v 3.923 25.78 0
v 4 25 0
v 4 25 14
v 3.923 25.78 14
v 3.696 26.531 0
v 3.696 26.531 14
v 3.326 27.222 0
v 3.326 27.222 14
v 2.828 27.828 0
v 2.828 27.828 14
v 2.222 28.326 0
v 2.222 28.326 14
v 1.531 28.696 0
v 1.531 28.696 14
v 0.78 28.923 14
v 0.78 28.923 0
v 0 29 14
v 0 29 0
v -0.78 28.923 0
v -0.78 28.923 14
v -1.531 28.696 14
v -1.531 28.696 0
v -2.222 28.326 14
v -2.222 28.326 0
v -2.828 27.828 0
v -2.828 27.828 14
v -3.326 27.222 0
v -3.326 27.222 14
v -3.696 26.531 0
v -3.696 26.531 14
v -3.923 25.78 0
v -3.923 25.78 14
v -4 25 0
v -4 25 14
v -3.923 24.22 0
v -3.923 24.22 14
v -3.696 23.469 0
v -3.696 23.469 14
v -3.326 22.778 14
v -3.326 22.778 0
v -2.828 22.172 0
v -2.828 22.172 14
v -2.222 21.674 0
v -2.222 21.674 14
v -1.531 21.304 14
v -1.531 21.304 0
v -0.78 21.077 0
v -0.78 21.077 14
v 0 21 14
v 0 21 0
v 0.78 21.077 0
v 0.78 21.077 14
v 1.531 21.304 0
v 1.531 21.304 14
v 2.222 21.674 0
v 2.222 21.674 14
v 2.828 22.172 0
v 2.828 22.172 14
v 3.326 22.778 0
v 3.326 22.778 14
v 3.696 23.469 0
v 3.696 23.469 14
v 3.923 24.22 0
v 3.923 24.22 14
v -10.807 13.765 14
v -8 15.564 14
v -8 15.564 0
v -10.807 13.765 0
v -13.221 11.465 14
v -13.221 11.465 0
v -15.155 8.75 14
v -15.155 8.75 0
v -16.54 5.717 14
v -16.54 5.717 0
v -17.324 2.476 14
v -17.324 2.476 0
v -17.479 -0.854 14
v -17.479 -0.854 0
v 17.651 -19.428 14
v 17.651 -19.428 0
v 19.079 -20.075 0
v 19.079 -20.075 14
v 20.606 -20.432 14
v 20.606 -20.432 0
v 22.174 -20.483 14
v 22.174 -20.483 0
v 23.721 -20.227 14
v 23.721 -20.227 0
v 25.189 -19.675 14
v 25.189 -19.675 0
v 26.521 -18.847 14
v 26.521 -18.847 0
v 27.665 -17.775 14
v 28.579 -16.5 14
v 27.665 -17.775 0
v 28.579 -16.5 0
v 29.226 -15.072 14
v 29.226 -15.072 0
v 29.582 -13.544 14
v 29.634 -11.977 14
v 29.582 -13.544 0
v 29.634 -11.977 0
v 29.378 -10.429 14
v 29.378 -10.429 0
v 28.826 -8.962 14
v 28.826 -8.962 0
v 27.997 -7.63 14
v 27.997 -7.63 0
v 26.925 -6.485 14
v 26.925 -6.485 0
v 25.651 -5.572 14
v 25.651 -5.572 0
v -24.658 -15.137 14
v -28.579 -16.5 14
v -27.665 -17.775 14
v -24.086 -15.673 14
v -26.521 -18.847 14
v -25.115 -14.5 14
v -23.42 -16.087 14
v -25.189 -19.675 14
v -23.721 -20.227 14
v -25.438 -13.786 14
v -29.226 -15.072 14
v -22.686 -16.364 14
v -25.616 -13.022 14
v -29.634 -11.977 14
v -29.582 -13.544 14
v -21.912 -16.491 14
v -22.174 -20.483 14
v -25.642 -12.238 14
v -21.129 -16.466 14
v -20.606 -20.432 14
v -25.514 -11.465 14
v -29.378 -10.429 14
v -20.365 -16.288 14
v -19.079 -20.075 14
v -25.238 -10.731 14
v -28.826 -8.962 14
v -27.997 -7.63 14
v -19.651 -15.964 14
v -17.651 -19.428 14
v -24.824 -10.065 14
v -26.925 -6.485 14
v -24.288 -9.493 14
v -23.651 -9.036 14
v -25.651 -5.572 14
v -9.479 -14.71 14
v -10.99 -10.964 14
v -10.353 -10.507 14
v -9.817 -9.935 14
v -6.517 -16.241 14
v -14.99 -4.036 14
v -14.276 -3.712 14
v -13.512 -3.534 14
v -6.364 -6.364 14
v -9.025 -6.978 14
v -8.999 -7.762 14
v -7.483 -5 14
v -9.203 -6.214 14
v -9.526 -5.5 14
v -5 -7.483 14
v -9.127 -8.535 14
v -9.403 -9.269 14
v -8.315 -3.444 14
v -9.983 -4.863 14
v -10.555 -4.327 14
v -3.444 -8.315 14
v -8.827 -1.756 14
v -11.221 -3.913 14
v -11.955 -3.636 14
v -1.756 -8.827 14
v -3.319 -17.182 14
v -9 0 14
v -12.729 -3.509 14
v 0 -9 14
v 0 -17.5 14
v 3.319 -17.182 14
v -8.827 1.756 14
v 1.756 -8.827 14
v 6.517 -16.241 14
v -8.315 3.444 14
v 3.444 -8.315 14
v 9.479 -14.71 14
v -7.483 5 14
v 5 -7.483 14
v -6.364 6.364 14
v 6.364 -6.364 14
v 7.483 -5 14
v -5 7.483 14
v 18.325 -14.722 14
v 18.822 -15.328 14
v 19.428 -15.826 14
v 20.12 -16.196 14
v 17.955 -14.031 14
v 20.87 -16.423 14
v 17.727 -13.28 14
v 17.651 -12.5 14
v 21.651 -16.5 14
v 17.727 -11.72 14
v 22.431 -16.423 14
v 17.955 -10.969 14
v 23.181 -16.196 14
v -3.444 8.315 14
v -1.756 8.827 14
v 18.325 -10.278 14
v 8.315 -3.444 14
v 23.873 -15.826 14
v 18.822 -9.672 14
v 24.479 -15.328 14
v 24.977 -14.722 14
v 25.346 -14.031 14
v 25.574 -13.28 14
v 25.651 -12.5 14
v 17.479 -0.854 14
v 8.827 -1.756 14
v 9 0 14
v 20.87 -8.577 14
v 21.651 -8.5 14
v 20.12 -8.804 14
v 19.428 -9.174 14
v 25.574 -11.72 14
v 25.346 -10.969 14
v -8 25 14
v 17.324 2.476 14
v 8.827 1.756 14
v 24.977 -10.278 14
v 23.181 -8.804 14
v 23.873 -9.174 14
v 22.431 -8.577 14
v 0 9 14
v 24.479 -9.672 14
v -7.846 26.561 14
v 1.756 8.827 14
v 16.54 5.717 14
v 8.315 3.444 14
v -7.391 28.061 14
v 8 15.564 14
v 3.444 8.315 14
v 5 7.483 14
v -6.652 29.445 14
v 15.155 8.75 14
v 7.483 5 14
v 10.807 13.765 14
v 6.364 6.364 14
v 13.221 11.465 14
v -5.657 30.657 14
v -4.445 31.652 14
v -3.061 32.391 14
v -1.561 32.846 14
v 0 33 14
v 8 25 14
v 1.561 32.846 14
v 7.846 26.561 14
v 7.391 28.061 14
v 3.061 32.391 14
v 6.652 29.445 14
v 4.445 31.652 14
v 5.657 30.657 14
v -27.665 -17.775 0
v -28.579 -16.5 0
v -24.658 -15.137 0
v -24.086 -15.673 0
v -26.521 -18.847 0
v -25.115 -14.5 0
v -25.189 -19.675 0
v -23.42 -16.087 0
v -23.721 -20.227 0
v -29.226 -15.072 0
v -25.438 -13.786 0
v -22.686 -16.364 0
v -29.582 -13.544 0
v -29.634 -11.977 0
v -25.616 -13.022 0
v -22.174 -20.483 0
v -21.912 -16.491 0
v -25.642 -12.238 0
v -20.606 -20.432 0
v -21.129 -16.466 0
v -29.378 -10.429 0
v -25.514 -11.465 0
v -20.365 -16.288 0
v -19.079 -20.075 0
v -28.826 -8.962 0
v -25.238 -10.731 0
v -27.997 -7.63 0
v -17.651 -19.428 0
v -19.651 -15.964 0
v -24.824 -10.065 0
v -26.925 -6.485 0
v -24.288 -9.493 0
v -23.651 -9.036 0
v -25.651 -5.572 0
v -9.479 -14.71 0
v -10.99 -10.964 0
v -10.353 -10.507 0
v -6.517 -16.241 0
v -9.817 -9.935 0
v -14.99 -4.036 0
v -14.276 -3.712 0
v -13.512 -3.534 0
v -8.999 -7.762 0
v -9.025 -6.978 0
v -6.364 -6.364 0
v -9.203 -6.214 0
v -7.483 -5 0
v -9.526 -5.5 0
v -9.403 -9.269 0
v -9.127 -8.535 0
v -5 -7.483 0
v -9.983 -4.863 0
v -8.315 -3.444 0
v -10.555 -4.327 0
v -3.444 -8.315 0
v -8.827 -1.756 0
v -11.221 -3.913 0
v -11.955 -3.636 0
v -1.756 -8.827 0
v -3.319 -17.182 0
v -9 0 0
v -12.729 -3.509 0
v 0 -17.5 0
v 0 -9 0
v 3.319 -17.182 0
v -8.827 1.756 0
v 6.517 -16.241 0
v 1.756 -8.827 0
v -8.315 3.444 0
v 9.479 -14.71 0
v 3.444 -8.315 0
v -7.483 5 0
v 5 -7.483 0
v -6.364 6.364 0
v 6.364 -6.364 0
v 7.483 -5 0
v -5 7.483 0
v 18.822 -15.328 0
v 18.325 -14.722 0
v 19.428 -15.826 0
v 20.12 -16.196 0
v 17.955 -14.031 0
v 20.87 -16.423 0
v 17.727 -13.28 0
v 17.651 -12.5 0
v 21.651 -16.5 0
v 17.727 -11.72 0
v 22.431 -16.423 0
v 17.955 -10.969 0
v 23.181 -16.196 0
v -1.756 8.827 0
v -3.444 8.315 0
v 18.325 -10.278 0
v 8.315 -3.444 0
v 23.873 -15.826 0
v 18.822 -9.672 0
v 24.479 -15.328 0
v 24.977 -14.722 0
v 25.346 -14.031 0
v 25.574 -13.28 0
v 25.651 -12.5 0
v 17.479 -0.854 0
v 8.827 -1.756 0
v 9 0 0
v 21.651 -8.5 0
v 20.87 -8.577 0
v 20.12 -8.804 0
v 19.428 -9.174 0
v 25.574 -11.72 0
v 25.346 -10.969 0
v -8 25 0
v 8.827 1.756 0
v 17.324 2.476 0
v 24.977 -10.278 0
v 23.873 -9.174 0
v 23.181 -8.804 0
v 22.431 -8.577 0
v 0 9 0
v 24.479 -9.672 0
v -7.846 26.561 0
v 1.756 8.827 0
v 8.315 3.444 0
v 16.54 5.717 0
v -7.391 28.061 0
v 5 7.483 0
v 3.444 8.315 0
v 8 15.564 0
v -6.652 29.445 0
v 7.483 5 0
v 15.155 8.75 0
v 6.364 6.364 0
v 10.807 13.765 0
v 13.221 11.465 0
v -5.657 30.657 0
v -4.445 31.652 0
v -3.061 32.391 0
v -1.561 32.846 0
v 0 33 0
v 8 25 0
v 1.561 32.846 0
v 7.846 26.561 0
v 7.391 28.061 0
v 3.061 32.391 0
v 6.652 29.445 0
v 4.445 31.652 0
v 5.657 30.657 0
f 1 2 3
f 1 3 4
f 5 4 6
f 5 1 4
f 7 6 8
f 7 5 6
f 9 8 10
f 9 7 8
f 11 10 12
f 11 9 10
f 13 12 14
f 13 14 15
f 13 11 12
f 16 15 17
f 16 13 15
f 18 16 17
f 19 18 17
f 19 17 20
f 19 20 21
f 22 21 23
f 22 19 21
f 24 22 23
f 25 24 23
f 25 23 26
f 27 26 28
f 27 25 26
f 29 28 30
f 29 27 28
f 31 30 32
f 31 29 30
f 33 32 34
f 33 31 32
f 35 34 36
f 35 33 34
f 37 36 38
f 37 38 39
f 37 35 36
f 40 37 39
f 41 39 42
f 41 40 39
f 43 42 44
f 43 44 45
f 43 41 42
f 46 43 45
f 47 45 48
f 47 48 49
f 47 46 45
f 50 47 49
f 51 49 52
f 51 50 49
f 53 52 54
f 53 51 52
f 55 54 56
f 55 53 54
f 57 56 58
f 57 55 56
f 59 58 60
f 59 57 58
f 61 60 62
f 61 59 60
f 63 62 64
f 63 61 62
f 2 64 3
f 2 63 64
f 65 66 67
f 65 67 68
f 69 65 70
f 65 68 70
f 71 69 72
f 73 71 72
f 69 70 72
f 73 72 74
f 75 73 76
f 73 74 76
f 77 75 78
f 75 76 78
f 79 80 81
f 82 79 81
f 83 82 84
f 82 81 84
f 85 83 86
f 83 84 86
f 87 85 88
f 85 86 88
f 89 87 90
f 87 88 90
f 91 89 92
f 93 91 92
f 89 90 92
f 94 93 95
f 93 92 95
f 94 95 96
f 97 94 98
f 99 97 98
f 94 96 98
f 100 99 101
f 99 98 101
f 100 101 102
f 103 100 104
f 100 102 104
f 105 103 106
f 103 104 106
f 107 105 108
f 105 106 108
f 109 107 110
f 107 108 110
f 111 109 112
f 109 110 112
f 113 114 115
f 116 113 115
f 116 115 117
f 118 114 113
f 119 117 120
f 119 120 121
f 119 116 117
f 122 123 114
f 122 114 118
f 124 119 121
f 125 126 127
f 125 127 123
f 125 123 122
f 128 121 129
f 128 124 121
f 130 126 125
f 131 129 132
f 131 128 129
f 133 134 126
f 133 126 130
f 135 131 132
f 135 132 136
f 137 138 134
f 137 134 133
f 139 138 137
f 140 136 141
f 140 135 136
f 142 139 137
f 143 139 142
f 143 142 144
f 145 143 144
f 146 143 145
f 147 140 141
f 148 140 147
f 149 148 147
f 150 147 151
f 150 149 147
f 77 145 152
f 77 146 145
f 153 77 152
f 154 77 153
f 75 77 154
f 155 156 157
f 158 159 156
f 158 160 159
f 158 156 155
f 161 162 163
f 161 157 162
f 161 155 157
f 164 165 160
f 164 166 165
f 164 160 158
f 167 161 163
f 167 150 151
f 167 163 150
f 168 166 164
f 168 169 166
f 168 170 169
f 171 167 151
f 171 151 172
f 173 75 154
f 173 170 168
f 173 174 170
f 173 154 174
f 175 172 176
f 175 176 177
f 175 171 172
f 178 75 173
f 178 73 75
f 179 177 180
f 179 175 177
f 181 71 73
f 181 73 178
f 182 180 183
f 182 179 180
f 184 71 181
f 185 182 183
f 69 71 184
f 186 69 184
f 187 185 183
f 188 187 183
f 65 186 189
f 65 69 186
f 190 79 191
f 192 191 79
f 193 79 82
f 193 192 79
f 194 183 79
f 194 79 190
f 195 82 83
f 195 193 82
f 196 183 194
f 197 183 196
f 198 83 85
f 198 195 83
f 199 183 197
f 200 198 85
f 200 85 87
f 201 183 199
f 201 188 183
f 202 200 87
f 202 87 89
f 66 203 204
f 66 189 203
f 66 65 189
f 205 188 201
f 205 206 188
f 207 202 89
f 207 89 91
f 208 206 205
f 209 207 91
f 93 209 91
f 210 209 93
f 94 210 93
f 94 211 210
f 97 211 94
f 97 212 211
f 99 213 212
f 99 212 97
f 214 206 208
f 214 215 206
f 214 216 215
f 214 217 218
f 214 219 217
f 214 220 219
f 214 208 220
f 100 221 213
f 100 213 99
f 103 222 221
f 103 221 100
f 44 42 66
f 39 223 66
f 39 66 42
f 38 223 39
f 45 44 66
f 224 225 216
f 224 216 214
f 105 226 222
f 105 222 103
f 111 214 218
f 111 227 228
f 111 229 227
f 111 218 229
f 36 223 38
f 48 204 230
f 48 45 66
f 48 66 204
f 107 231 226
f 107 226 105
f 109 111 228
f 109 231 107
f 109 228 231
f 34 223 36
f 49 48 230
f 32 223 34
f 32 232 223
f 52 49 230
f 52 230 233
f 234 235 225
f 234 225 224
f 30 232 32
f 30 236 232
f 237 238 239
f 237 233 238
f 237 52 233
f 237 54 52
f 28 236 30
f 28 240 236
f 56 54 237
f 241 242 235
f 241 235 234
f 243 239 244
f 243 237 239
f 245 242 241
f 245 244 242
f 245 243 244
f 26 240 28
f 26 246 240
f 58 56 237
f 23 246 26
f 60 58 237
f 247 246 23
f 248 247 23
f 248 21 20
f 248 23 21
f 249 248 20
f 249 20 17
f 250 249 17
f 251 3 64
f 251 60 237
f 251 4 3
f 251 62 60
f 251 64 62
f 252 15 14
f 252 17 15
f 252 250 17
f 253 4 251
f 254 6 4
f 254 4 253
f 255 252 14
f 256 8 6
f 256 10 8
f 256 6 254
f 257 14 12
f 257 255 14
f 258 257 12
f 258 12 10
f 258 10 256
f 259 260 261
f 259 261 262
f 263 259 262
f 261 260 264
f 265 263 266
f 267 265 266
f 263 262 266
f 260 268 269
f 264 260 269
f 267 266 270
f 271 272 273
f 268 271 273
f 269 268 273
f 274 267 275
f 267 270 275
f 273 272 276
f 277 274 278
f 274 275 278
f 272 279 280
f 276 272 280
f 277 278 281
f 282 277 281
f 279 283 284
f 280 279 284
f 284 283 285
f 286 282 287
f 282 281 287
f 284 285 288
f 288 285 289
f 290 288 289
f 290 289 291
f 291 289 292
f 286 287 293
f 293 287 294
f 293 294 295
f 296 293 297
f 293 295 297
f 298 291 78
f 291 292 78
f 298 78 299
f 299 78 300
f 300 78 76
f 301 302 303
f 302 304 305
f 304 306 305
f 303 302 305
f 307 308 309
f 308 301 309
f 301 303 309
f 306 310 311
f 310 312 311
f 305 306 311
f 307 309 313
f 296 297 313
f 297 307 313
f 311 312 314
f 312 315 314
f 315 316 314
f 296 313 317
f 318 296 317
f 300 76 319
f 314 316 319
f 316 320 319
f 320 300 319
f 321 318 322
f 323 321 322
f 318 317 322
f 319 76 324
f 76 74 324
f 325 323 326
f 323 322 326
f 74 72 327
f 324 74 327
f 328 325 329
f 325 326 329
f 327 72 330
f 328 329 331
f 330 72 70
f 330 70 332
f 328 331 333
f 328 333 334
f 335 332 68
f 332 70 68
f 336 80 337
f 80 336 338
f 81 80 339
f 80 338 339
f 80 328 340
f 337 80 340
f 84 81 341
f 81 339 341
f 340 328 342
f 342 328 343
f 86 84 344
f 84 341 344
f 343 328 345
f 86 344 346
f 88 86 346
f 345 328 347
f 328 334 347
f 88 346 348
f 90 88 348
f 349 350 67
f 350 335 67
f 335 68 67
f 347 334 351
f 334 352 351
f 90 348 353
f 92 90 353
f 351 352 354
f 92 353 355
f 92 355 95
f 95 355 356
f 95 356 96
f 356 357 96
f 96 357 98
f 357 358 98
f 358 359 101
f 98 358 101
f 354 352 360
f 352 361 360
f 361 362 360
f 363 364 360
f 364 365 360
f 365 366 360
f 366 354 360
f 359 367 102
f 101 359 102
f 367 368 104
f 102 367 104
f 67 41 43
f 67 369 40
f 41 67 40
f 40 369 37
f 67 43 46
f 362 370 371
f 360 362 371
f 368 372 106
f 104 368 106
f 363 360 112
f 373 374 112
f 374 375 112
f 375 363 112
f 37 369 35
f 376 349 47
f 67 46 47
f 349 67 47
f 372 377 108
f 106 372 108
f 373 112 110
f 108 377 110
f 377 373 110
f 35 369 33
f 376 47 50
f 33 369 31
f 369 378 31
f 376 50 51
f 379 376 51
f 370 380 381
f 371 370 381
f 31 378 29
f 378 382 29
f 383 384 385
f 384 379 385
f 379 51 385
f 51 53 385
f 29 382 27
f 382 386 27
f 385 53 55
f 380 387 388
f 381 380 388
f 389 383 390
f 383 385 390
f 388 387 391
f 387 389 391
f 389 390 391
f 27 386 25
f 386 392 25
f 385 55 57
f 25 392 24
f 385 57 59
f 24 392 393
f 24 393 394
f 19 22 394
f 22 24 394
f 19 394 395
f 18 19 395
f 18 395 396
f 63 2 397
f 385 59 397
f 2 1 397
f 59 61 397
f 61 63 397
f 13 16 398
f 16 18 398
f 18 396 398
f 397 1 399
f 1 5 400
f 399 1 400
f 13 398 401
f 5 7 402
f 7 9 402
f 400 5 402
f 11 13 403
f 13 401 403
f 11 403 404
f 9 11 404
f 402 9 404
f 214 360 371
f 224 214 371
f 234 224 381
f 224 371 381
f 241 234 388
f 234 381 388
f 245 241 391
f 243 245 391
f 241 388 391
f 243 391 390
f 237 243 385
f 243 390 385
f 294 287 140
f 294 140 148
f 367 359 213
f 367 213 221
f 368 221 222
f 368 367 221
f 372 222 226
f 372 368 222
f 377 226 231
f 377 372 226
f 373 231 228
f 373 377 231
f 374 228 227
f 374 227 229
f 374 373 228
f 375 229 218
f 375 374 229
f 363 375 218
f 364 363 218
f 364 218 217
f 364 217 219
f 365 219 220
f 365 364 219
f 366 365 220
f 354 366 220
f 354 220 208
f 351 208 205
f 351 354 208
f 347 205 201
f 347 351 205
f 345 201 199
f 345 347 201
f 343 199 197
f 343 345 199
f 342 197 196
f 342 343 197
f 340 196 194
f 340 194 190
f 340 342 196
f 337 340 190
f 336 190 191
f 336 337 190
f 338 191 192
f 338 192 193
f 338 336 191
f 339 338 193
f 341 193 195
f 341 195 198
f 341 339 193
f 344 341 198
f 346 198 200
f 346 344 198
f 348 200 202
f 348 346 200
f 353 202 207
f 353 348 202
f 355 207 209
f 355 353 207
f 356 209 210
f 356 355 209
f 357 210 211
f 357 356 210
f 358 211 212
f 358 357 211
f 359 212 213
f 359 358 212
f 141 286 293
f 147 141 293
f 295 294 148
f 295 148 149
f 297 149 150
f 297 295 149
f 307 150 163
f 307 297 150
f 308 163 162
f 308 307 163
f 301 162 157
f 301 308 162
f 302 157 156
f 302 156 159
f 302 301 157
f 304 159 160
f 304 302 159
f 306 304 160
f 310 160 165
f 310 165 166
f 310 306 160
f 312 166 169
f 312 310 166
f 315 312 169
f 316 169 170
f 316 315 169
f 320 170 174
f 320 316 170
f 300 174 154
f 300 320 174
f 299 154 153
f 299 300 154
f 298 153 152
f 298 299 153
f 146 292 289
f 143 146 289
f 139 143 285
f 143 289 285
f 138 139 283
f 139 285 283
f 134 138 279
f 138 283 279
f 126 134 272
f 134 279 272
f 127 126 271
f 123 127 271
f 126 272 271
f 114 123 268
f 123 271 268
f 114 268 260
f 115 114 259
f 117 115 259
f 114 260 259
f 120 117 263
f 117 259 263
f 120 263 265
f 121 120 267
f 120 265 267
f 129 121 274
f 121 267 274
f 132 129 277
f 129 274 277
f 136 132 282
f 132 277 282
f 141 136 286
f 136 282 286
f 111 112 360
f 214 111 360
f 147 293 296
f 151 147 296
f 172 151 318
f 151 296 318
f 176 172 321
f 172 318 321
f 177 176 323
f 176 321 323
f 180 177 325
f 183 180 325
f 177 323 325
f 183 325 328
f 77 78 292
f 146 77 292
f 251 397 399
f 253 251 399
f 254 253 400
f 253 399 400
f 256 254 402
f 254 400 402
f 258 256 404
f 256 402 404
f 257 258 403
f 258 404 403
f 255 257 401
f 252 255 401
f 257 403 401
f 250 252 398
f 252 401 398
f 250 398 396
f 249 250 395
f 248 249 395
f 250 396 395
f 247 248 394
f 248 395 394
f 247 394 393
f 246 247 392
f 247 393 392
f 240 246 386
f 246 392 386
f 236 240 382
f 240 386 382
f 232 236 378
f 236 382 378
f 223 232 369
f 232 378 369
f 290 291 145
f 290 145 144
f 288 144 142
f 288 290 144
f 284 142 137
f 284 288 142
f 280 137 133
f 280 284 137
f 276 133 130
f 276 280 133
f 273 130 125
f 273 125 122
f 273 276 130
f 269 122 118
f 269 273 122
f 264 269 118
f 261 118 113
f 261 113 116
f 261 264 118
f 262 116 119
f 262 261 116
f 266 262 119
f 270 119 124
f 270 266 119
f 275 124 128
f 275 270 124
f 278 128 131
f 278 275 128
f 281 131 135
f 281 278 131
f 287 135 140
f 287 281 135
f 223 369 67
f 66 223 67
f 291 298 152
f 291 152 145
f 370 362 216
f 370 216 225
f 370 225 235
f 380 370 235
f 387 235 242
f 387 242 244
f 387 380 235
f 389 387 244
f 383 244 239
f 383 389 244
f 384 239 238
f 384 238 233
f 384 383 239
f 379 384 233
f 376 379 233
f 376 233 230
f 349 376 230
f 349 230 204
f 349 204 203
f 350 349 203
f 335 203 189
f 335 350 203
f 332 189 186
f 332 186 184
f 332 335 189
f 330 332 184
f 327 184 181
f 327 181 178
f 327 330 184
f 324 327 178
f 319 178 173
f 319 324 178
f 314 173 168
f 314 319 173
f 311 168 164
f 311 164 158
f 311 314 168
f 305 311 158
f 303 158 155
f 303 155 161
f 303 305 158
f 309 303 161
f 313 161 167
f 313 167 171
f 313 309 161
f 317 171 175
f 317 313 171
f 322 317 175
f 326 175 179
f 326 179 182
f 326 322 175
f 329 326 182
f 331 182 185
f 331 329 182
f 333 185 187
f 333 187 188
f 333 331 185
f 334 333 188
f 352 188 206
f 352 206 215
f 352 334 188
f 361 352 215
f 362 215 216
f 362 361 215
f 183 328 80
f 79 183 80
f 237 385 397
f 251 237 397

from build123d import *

# Parameters (mm, degrees)
SKETCH_1_R      = 9
SKETCH_1_R_2    = 4
EXTRUDE_1_DEPTH = 14


with BuildPart() as part:
    # Эскиз1 → Бобышка-Вытянуть1 (new body)
    with BuildSketch(Plane.XY):
        with BuildLine():
            Line((-8, 25), (-8, 15.564382416))
            ThreePointArc((-8, 15.564382416), (-15.155444566, 8.75), (-17.479150567, -0.853987978))
            Line((-17.479150567, -0.853987978), (-25.650635095, -5.57179677))
            ThreePointArc((-25.650635095, -5.57179677), (-28.578838325, -16.5), (-17.650635095, -19.42820323))
            Line((-17.650635095, -19.42820323), (-9.479150567, -14.710394438))
            ThreePointArc((-9.479150567, -14.710394438), (0, -17.5), (9.479150567, -14.710394438))
            Line((9.479150567, -14.710394438), (17.650635095, -19.42820323))
            ThreePointArc((17.650635095, -19.42820323), (28.578838325, -16.5), (25.650635095, -5.57179677))
            Line((25.650635095, -5.57179677), (17.479150567, -0.853987978))
            ThreePointArc((17.479150567, -0.853987978), (15.155444566, 8.75), (8, 15.564382416))
            Line((8, 15.564382416), (8, 25))
            ThreePointArc((8, 25), (0, 33), (-8, 25))
        make_face()
        Circle(SKETCH_1_R, mode=Mode.SUBTRACT)
        with Locations((0, 25)):
            Circle(SKETCH_1_R_2, mode=Mode.SUBTRACT)
        with Locations((21.650635095, -12.5)):
            Circle(SKETCH_1_R_2, mode=Mode.SUBTRACT)
        with BuildLine():
            Line((-14.990381057, -4.035898385), (-23.650635095, -9.035898385))
            ThreePointArc((-23.650635095, -9.035898385), (-25.11473671, -14.5), (-19.650635095, -15.964101615))
            Line((-19.650635095, -15.964101615), (-10.990381057, -10.964101615))
            ThreePointArc((-10.990381057, -10.964101615), (-9.526279442, -5.5), (-14.990381057, -4.035898385))
        make_face(mode=Mode.SUBTRACT)
    extrude(amount=EXTRUDE_1_DEPTH)


solid = part.part
